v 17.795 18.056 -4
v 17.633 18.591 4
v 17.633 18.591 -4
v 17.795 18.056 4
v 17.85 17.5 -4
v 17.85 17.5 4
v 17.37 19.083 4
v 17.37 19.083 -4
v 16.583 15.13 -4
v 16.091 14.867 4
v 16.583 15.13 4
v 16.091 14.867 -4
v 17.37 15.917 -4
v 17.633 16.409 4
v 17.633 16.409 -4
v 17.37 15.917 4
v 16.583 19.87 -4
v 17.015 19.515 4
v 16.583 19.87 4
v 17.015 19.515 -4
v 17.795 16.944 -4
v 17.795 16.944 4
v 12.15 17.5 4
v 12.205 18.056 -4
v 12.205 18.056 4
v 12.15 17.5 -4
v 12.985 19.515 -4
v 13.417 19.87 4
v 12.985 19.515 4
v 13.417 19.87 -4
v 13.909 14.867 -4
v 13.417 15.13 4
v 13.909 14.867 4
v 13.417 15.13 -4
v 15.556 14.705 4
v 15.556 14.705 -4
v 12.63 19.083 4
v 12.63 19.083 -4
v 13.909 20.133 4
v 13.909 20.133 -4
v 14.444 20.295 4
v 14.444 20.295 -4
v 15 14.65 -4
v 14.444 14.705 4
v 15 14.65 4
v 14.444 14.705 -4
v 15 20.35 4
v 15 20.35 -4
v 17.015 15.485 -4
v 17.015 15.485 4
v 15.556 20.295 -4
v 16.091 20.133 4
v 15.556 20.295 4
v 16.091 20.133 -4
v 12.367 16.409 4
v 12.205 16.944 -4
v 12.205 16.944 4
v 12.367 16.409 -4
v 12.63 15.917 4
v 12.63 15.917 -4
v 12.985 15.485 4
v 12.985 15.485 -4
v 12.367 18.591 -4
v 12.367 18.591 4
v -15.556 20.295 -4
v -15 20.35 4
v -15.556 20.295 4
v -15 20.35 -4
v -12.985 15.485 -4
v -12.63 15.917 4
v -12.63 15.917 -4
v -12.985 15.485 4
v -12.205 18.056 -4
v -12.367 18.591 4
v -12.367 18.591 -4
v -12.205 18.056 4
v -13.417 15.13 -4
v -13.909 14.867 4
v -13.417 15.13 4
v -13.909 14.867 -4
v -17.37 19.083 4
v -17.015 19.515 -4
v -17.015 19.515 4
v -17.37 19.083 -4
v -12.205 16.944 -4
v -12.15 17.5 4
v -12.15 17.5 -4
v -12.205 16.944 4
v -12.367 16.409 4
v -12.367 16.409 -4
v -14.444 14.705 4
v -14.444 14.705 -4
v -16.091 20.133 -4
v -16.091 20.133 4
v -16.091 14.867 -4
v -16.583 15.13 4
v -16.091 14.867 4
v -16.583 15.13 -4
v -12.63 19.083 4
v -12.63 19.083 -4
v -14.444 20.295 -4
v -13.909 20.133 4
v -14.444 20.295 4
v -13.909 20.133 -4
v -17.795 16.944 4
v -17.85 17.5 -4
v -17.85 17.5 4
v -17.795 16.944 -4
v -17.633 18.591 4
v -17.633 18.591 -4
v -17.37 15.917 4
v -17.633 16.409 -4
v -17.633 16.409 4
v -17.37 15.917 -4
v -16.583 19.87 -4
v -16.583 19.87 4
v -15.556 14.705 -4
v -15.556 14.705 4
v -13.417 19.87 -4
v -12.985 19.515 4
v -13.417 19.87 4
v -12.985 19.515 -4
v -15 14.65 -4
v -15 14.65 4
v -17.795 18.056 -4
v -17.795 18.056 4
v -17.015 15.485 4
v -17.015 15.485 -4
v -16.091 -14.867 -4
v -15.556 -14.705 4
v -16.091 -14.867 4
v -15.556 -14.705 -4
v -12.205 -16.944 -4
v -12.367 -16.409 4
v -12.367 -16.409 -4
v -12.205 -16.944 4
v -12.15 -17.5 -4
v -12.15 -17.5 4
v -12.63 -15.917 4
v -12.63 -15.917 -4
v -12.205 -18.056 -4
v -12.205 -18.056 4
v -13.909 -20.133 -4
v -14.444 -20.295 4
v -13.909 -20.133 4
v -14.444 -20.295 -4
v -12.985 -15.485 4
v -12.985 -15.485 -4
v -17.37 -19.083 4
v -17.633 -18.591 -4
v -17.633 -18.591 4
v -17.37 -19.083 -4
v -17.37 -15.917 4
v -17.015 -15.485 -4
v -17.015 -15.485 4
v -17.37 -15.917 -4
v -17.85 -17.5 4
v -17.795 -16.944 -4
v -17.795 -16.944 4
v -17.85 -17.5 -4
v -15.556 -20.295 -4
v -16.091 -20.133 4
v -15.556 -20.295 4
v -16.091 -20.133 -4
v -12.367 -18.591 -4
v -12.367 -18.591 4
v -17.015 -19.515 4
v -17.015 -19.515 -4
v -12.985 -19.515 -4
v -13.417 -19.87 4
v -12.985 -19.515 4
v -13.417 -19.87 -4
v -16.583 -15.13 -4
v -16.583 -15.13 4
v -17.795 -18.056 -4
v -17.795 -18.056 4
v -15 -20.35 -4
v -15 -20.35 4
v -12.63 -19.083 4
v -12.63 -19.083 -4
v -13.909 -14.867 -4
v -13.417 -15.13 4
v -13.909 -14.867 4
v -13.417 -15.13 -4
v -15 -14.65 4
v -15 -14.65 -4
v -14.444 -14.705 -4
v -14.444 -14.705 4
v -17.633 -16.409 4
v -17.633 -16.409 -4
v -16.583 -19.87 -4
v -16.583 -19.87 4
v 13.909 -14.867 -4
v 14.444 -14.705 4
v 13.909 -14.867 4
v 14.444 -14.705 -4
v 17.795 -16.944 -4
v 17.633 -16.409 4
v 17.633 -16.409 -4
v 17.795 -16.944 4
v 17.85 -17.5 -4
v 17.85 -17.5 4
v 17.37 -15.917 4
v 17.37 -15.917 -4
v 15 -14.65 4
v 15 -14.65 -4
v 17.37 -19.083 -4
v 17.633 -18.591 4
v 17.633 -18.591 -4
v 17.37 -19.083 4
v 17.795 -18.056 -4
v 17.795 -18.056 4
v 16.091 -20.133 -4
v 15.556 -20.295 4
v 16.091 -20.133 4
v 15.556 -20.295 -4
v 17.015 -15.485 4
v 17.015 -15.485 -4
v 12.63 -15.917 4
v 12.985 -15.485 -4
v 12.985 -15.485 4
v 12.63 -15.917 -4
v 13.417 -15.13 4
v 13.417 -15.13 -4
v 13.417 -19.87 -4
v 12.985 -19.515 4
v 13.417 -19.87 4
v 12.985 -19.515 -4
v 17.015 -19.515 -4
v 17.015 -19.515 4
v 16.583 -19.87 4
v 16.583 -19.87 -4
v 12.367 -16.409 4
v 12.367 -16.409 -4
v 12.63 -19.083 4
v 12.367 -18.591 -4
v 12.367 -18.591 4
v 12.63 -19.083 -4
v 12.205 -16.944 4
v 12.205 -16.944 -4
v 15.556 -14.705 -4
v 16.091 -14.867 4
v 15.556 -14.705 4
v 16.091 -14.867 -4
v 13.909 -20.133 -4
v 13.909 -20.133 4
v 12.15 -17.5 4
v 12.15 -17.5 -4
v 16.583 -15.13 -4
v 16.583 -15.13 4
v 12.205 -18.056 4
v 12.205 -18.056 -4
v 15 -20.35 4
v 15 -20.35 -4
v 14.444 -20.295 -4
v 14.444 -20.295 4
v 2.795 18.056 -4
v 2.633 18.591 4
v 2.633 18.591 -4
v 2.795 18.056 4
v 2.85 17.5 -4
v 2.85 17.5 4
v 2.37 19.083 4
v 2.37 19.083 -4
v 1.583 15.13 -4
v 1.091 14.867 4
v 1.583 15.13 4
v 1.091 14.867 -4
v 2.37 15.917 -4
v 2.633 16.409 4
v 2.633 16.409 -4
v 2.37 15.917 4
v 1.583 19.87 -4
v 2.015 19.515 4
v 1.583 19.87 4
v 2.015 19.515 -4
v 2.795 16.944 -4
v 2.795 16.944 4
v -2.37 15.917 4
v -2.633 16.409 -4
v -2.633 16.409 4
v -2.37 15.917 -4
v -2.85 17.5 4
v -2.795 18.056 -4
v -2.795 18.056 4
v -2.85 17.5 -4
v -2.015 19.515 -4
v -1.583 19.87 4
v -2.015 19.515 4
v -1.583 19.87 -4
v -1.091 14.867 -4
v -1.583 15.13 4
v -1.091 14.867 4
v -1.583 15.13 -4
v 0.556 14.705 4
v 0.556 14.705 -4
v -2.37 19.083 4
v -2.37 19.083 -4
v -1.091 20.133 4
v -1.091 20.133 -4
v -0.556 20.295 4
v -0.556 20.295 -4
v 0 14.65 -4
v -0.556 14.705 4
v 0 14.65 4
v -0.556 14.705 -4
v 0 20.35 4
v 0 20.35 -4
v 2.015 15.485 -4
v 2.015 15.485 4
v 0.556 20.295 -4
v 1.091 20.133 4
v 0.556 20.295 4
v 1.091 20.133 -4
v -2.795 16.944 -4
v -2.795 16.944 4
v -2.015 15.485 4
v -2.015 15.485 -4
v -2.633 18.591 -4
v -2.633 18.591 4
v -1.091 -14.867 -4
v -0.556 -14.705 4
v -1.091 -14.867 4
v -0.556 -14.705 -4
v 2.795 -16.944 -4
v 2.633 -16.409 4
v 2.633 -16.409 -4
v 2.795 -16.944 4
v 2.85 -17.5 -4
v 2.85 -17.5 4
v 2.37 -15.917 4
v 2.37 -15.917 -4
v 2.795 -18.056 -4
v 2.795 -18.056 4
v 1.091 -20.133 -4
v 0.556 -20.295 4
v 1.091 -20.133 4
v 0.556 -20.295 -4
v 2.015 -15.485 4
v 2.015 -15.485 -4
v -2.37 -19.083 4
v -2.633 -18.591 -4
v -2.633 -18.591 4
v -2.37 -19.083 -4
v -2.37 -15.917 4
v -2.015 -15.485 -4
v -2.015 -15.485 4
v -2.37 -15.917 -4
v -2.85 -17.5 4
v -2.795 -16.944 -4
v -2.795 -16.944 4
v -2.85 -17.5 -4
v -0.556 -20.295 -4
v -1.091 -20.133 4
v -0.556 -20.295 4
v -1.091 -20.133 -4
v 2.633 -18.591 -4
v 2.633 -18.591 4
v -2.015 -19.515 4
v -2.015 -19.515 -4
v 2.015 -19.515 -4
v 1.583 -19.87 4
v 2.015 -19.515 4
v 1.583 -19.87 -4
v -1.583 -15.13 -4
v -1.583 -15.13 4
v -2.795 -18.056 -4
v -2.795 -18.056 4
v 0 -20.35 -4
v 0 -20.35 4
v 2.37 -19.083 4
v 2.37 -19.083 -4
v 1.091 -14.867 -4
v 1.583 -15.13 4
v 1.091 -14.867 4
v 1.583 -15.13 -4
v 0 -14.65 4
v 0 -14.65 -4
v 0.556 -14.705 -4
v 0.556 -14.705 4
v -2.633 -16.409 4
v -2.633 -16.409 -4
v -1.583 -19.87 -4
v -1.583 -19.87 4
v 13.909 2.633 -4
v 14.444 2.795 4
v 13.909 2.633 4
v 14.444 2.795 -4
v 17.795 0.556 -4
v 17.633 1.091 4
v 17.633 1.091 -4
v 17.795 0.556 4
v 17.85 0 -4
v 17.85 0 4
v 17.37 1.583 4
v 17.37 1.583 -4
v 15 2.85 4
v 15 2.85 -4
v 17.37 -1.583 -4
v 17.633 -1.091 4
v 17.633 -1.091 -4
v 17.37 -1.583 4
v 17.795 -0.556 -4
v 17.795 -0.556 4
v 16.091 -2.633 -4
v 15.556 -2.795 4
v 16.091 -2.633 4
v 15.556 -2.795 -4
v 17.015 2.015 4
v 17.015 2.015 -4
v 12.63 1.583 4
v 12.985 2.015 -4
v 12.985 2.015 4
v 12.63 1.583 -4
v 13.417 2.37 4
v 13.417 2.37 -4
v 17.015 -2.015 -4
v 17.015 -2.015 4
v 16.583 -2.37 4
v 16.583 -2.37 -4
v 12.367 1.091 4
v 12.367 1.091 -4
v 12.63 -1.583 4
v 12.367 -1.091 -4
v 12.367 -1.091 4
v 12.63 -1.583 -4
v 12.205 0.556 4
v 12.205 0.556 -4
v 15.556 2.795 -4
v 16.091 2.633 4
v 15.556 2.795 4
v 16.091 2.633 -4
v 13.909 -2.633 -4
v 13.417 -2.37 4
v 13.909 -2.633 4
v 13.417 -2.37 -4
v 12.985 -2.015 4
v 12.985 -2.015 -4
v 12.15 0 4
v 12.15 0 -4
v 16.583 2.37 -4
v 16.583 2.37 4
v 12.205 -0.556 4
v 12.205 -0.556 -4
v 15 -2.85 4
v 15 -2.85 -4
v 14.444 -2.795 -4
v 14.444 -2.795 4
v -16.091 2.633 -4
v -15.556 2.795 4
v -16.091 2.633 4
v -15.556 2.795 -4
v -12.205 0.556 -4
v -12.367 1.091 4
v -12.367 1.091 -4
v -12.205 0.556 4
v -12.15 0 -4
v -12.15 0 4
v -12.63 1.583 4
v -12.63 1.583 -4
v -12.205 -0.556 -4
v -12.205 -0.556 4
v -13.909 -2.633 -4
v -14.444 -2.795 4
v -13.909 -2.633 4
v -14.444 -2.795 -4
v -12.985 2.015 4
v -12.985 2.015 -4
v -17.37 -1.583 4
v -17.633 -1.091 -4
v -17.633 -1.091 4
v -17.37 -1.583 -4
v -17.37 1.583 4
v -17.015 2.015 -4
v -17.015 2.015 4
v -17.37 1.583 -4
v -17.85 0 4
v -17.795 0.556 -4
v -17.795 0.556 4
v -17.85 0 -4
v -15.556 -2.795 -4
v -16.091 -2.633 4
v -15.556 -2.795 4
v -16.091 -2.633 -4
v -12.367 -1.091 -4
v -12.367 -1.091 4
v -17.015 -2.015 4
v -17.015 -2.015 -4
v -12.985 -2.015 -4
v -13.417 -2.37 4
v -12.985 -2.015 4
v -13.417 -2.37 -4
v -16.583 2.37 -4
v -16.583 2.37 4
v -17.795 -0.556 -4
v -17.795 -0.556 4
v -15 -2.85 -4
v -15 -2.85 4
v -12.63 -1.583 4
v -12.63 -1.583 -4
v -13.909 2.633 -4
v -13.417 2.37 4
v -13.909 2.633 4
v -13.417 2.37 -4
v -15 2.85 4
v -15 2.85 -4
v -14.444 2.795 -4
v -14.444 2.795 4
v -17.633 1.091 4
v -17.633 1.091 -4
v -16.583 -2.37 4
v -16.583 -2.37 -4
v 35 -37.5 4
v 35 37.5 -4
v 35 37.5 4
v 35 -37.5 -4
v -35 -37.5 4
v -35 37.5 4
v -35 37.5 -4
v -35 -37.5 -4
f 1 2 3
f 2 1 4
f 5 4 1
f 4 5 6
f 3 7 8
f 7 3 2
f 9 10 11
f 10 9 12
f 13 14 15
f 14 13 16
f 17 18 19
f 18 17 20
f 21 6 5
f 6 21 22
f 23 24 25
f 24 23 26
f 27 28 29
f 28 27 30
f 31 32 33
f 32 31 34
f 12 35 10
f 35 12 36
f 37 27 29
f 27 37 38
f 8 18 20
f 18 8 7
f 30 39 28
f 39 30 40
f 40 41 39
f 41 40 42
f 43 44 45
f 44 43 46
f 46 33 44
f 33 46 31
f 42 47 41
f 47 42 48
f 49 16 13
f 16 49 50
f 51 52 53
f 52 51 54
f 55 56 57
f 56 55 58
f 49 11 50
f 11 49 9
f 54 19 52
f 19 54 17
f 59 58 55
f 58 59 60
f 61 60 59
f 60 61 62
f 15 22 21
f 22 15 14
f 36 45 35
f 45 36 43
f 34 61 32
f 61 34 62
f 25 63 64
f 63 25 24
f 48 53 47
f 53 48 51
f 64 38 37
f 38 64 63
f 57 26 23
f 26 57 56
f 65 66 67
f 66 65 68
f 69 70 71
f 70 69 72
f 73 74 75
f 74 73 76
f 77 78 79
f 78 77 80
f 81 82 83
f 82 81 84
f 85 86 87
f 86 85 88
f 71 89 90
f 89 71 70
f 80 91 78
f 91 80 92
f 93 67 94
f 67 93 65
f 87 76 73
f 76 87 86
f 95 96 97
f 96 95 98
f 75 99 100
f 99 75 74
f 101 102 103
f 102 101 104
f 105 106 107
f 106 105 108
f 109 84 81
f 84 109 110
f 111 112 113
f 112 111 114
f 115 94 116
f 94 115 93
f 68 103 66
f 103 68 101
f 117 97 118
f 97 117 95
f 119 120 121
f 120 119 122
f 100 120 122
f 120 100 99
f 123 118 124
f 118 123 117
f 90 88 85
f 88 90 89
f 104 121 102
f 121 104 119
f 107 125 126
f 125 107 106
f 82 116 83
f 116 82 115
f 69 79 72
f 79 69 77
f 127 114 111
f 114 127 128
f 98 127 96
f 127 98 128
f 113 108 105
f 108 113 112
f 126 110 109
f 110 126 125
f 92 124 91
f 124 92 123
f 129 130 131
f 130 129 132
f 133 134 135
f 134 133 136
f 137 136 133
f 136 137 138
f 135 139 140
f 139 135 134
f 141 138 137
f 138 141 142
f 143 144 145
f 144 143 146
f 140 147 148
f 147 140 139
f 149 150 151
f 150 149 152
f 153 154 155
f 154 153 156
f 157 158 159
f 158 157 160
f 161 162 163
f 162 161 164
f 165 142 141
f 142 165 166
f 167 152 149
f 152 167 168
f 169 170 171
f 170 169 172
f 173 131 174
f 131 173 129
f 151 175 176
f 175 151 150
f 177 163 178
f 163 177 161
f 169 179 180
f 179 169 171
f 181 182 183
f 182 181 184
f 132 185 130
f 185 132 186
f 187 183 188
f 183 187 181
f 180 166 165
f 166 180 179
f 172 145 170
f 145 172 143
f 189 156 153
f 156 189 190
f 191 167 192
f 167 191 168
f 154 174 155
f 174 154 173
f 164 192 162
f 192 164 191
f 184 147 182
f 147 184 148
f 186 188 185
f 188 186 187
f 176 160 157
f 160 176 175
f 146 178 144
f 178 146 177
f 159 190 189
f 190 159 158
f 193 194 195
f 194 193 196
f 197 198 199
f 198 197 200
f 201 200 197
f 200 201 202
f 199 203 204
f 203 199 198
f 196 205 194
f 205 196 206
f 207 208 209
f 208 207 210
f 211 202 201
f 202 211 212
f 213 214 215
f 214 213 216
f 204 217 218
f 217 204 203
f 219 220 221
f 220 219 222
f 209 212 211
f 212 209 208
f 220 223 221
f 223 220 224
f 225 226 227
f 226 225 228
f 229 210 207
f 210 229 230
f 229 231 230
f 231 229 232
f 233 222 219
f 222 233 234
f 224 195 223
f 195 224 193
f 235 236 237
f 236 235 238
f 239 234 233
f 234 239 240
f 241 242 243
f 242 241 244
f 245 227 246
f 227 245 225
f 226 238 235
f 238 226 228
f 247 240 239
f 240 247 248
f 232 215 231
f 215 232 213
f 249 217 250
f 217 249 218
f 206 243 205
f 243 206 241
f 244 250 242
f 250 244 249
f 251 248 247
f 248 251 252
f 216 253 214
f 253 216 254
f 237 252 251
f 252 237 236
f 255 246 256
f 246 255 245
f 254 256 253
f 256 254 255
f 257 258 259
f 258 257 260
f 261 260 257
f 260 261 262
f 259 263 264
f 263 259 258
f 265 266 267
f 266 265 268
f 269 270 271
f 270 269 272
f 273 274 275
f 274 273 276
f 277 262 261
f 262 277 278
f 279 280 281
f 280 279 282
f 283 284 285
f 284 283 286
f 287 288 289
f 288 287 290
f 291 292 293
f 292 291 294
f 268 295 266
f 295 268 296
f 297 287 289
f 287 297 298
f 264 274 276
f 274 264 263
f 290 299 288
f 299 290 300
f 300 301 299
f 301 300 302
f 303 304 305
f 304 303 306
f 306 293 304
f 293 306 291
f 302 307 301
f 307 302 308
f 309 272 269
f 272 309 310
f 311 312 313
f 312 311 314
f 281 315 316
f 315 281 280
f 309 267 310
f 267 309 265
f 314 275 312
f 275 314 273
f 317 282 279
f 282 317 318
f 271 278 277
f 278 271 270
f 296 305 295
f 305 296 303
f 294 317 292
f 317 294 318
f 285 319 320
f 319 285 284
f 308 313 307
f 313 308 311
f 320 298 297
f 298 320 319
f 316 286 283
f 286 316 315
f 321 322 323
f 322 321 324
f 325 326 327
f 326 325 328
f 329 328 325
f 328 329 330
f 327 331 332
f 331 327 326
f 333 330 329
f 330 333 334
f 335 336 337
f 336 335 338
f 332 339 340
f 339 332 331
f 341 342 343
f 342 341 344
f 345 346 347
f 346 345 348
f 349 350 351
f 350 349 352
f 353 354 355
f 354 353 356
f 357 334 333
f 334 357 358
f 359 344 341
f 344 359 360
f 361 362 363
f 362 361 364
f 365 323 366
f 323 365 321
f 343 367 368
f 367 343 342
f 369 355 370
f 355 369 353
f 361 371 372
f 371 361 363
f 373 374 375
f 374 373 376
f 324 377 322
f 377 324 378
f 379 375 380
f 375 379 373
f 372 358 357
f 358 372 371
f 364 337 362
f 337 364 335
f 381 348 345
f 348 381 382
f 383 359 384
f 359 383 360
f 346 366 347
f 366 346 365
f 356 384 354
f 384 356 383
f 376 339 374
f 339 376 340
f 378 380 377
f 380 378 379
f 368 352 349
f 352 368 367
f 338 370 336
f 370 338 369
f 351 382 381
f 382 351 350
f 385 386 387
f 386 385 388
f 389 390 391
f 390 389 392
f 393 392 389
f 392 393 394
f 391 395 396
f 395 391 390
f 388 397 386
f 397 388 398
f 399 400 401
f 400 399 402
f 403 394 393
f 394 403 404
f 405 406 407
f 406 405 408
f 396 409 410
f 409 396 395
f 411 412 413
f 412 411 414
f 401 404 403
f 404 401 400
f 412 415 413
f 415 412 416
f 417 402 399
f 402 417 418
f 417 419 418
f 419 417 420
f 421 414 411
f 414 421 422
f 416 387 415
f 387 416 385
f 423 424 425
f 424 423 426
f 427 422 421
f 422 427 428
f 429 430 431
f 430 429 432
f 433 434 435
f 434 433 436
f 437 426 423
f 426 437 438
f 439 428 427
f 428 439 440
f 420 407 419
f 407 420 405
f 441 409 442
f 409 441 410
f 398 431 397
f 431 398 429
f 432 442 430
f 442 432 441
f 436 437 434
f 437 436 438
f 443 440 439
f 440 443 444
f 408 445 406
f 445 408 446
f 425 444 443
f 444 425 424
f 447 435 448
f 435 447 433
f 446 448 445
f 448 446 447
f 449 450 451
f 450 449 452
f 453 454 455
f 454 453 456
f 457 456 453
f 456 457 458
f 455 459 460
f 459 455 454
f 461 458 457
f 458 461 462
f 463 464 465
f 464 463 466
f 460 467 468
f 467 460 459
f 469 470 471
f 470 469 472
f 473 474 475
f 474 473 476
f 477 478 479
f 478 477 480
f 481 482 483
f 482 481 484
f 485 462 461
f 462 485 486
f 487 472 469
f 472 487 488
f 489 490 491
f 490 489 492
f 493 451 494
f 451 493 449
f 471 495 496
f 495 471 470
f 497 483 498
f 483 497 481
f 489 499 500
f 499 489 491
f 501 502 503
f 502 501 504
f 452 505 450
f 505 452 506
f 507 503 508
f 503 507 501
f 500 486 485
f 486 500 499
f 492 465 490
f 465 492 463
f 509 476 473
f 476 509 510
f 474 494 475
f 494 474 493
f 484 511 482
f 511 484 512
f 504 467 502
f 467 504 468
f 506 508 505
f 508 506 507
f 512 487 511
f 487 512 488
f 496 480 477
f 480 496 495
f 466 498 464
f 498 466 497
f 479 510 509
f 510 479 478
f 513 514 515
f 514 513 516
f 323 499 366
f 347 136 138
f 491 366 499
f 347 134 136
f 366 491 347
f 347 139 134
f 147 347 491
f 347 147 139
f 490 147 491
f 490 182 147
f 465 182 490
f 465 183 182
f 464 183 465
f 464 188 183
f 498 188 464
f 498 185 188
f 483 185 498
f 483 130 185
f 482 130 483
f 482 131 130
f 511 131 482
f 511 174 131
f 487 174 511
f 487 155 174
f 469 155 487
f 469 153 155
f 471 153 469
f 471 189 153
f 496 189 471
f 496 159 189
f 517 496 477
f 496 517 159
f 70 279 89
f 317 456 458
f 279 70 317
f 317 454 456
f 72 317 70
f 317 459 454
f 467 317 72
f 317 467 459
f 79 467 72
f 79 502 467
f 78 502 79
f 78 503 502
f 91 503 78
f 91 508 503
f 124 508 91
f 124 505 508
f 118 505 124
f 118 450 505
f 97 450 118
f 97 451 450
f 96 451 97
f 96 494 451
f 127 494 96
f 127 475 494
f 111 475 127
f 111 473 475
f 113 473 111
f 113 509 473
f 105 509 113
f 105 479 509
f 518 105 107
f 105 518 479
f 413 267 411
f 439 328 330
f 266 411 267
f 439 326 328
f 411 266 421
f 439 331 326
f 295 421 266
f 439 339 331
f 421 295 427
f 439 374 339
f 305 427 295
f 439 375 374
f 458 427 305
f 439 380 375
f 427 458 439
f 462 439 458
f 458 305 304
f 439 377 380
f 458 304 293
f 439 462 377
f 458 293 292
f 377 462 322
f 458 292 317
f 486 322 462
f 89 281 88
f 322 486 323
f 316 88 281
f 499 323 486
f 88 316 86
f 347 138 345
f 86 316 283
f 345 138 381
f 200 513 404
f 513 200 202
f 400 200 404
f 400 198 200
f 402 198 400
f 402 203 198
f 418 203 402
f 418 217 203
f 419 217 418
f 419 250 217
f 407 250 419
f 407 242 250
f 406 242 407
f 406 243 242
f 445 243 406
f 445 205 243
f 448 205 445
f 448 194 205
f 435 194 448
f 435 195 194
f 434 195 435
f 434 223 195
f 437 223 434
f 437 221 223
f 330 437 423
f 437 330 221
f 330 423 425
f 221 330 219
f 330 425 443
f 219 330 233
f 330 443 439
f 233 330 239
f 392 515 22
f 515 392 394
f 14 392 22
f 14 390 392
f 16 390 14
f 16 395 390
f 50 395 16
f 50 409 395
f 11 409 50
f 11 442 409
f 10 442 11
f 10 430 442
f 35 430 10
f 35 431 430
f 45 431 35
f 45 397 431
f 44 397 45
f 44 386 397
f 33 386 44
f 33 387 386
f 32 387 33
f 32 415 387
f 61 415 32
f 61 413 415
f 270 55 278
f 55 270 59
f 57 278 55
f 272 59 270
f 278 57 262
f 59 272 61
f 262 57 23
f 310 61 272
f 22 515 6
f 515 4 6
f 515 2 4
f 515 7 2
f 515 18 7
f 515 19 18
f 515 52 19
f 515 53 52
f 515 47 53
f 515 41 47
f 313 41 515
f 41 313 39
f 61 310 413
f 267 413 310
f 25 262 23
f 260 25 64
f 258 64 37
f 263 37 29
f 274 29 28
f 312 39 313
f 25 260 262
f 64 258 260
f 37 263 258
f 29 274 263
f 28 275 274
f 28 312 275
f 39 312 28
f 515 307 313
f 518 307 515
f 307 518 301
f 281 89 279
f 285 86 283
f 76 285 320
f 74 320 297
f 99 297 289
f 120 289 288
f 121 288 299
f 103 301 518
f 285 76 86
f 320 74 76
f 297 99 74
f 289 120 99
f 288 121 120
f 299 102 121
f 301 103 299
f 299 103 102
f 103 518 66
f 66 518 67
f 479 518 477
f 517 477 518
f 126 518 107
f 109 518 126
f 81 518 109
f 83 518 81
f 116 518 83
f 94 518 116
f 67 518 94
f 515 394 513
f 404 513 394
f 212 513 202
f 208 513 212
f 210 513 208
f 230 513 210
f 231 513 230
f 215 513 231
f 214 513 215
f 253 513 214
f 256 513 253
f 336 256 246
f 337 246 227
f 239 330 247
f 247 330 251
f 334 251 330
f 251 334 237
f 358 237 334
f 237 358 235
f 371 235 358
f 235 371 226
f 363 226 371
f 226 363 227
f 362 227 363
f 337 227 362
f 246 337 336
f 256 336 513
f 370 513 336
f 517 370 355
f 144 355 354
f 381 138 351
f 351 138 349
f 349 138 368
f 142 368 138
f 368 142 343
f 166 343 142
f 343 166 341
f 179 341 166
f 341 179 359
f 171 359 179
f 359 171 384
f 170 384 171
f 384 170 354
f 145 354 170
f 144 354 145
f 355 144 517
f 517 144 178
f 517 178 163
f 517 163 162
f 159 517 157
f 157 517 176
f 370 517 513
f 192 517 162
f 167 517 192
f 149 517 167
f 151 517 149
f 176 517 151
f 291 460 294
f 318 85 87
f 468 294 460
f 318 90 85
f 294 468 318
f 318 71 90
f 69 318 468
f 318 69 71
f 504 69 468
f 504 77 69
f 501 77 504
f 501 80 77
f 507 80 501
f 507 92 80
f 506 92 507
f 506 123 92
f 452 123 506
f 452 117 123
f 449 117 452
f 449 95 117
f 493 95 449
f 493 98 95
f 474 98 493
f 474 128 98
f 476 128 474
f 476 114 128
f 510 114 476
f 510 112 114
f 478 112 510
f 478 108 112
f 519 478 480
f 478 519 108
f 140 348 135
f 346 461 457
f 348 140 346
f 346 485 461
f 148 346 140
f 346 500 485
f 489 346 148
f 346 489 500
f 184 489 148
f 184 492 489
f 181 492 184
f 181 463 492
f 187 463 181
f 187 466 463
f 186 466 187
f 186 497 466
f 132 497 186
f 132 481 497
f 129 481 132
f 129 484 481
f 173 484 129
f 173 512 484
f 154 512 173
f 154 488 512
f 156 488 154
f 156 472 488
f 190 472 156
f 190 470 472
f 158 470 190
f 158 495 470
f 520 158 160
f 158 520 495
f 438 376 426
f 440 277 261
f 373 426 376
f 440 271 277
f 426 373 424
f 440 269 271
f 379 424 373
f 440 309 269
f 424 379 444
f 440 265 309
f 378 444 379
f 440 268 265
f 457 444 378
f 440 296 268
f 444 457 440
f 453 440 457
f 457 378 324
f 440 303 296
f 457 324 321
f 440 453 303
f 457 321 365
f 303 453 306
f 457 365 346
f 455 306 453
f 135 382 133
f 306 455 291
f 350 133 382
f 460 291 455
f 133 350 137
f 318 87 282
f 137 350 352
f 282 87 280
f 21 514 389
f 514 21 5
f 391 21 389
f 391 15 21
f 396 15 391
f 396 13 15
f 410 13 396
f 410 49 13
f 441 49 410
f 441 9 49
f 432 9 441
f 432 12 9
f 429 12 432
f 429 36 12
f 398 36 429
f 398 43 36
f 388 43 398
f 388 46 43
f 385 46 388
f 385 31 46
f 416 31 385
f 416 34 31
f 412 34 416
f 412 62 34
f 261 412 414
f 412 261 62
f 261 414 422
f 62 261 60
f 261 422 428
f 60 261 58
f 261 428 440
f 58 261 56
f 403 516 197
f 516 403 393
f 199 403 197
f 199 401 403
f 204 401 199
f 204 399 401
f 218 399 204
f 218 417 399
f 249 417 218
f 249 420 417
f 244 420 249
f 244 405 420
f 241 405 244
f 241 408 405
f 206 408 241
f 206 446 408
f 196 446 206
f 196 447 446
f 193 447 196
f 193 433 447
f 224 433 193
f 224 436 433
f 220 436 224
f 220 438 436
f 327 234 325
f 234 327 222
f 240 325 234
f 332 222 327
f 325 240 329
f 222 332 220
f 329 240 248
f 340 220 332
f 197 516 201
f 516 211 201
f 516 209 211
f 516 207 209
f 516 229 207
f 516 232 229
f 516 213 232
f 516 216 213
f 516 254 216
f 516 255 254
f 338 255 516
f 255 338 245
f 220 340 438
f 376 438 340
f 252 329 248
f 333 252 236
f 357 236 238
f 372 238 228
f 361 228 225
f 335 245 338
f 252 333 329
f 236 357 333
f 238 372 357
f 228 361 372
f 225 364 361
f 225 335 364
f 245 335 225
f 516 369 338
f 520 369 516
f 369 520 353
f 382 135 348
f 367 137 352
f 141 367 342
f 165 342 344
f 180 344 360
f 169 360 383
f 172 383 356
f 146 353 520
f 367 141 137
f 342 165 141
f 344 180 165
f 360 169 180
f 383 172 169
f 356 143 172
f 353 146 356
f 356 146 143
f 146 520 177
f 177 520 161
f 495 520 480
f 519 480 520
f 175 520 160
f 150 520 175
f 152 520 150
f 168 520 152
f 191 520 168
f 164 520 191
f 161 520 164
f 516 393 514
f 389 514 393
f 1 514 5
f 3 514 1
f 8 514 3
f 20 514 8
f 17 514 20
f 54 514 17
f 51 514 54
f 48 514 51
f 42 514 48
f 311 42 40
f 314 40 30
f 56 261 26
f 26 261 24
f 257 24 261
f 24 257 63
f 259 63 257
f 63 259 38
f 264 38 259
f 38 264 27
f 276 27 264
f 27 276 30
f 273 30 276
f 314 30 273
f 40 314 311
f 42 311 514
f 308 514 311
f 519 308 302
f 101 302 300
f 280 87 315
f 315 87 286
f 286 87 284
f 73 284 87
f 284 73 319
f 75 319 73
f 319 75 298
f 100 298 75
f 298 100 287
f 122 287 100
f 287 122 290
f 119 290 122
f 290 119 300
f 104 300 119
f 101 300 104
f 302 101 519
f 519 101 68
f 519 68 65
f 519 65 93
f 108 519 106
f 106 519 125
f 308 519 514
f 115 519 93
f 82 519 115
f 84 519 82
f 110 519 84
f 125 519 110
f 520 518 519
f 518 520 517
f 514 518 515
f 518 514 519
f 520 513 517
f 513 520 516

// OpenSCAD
$fn = 32;

// ----------------------------------------------------------------------
// Corner plate 70 x 75 x 8
// 8 holes, centres taken from the edge offset
// ----------------------------------------------------------------------

// --- parameters (mm) ---
plate = [70, 75, 8];    // overall size (x, y, z)
holes = 8;              // number of holes the drawing asks for
bore_d = 5.5;           // nominal hole diameter from the drawing
print_allowance = 0.2;  // clearance added for printing
edge = 20;              // hole centre offset from the plate edge

// --- derived feature positions (mm) ---
hole_d = bore_d + print_allowance;  // = 5.7   hole diameter as printed
corner_x = plate[0] / 2 - edge;     // = 15   corner hole X
corner_y = plate[1] / 2 - edge;     // = 17.5   corner hole Y
feature_centers = [
  [corner_x, corner_y],
  [-corner_x, corner_y],
  [-corner_x, -corner_y],
  [corner_x, -corner_y],
  [0, corner_y],
  [0, -corner_y],
  [corner_x, 0],
  [-corner_x, 0]
];   // hole centres the loop below drills

// plate outline, every hole drilled through with the same cutters
difference() {
  cube(plate, center = true);
  for (centre = feature_centers)
    translate([centre[0], centre[1], 0])
      cylinder(d = hole_d, h = plate[2] + 2, center = true);
}
